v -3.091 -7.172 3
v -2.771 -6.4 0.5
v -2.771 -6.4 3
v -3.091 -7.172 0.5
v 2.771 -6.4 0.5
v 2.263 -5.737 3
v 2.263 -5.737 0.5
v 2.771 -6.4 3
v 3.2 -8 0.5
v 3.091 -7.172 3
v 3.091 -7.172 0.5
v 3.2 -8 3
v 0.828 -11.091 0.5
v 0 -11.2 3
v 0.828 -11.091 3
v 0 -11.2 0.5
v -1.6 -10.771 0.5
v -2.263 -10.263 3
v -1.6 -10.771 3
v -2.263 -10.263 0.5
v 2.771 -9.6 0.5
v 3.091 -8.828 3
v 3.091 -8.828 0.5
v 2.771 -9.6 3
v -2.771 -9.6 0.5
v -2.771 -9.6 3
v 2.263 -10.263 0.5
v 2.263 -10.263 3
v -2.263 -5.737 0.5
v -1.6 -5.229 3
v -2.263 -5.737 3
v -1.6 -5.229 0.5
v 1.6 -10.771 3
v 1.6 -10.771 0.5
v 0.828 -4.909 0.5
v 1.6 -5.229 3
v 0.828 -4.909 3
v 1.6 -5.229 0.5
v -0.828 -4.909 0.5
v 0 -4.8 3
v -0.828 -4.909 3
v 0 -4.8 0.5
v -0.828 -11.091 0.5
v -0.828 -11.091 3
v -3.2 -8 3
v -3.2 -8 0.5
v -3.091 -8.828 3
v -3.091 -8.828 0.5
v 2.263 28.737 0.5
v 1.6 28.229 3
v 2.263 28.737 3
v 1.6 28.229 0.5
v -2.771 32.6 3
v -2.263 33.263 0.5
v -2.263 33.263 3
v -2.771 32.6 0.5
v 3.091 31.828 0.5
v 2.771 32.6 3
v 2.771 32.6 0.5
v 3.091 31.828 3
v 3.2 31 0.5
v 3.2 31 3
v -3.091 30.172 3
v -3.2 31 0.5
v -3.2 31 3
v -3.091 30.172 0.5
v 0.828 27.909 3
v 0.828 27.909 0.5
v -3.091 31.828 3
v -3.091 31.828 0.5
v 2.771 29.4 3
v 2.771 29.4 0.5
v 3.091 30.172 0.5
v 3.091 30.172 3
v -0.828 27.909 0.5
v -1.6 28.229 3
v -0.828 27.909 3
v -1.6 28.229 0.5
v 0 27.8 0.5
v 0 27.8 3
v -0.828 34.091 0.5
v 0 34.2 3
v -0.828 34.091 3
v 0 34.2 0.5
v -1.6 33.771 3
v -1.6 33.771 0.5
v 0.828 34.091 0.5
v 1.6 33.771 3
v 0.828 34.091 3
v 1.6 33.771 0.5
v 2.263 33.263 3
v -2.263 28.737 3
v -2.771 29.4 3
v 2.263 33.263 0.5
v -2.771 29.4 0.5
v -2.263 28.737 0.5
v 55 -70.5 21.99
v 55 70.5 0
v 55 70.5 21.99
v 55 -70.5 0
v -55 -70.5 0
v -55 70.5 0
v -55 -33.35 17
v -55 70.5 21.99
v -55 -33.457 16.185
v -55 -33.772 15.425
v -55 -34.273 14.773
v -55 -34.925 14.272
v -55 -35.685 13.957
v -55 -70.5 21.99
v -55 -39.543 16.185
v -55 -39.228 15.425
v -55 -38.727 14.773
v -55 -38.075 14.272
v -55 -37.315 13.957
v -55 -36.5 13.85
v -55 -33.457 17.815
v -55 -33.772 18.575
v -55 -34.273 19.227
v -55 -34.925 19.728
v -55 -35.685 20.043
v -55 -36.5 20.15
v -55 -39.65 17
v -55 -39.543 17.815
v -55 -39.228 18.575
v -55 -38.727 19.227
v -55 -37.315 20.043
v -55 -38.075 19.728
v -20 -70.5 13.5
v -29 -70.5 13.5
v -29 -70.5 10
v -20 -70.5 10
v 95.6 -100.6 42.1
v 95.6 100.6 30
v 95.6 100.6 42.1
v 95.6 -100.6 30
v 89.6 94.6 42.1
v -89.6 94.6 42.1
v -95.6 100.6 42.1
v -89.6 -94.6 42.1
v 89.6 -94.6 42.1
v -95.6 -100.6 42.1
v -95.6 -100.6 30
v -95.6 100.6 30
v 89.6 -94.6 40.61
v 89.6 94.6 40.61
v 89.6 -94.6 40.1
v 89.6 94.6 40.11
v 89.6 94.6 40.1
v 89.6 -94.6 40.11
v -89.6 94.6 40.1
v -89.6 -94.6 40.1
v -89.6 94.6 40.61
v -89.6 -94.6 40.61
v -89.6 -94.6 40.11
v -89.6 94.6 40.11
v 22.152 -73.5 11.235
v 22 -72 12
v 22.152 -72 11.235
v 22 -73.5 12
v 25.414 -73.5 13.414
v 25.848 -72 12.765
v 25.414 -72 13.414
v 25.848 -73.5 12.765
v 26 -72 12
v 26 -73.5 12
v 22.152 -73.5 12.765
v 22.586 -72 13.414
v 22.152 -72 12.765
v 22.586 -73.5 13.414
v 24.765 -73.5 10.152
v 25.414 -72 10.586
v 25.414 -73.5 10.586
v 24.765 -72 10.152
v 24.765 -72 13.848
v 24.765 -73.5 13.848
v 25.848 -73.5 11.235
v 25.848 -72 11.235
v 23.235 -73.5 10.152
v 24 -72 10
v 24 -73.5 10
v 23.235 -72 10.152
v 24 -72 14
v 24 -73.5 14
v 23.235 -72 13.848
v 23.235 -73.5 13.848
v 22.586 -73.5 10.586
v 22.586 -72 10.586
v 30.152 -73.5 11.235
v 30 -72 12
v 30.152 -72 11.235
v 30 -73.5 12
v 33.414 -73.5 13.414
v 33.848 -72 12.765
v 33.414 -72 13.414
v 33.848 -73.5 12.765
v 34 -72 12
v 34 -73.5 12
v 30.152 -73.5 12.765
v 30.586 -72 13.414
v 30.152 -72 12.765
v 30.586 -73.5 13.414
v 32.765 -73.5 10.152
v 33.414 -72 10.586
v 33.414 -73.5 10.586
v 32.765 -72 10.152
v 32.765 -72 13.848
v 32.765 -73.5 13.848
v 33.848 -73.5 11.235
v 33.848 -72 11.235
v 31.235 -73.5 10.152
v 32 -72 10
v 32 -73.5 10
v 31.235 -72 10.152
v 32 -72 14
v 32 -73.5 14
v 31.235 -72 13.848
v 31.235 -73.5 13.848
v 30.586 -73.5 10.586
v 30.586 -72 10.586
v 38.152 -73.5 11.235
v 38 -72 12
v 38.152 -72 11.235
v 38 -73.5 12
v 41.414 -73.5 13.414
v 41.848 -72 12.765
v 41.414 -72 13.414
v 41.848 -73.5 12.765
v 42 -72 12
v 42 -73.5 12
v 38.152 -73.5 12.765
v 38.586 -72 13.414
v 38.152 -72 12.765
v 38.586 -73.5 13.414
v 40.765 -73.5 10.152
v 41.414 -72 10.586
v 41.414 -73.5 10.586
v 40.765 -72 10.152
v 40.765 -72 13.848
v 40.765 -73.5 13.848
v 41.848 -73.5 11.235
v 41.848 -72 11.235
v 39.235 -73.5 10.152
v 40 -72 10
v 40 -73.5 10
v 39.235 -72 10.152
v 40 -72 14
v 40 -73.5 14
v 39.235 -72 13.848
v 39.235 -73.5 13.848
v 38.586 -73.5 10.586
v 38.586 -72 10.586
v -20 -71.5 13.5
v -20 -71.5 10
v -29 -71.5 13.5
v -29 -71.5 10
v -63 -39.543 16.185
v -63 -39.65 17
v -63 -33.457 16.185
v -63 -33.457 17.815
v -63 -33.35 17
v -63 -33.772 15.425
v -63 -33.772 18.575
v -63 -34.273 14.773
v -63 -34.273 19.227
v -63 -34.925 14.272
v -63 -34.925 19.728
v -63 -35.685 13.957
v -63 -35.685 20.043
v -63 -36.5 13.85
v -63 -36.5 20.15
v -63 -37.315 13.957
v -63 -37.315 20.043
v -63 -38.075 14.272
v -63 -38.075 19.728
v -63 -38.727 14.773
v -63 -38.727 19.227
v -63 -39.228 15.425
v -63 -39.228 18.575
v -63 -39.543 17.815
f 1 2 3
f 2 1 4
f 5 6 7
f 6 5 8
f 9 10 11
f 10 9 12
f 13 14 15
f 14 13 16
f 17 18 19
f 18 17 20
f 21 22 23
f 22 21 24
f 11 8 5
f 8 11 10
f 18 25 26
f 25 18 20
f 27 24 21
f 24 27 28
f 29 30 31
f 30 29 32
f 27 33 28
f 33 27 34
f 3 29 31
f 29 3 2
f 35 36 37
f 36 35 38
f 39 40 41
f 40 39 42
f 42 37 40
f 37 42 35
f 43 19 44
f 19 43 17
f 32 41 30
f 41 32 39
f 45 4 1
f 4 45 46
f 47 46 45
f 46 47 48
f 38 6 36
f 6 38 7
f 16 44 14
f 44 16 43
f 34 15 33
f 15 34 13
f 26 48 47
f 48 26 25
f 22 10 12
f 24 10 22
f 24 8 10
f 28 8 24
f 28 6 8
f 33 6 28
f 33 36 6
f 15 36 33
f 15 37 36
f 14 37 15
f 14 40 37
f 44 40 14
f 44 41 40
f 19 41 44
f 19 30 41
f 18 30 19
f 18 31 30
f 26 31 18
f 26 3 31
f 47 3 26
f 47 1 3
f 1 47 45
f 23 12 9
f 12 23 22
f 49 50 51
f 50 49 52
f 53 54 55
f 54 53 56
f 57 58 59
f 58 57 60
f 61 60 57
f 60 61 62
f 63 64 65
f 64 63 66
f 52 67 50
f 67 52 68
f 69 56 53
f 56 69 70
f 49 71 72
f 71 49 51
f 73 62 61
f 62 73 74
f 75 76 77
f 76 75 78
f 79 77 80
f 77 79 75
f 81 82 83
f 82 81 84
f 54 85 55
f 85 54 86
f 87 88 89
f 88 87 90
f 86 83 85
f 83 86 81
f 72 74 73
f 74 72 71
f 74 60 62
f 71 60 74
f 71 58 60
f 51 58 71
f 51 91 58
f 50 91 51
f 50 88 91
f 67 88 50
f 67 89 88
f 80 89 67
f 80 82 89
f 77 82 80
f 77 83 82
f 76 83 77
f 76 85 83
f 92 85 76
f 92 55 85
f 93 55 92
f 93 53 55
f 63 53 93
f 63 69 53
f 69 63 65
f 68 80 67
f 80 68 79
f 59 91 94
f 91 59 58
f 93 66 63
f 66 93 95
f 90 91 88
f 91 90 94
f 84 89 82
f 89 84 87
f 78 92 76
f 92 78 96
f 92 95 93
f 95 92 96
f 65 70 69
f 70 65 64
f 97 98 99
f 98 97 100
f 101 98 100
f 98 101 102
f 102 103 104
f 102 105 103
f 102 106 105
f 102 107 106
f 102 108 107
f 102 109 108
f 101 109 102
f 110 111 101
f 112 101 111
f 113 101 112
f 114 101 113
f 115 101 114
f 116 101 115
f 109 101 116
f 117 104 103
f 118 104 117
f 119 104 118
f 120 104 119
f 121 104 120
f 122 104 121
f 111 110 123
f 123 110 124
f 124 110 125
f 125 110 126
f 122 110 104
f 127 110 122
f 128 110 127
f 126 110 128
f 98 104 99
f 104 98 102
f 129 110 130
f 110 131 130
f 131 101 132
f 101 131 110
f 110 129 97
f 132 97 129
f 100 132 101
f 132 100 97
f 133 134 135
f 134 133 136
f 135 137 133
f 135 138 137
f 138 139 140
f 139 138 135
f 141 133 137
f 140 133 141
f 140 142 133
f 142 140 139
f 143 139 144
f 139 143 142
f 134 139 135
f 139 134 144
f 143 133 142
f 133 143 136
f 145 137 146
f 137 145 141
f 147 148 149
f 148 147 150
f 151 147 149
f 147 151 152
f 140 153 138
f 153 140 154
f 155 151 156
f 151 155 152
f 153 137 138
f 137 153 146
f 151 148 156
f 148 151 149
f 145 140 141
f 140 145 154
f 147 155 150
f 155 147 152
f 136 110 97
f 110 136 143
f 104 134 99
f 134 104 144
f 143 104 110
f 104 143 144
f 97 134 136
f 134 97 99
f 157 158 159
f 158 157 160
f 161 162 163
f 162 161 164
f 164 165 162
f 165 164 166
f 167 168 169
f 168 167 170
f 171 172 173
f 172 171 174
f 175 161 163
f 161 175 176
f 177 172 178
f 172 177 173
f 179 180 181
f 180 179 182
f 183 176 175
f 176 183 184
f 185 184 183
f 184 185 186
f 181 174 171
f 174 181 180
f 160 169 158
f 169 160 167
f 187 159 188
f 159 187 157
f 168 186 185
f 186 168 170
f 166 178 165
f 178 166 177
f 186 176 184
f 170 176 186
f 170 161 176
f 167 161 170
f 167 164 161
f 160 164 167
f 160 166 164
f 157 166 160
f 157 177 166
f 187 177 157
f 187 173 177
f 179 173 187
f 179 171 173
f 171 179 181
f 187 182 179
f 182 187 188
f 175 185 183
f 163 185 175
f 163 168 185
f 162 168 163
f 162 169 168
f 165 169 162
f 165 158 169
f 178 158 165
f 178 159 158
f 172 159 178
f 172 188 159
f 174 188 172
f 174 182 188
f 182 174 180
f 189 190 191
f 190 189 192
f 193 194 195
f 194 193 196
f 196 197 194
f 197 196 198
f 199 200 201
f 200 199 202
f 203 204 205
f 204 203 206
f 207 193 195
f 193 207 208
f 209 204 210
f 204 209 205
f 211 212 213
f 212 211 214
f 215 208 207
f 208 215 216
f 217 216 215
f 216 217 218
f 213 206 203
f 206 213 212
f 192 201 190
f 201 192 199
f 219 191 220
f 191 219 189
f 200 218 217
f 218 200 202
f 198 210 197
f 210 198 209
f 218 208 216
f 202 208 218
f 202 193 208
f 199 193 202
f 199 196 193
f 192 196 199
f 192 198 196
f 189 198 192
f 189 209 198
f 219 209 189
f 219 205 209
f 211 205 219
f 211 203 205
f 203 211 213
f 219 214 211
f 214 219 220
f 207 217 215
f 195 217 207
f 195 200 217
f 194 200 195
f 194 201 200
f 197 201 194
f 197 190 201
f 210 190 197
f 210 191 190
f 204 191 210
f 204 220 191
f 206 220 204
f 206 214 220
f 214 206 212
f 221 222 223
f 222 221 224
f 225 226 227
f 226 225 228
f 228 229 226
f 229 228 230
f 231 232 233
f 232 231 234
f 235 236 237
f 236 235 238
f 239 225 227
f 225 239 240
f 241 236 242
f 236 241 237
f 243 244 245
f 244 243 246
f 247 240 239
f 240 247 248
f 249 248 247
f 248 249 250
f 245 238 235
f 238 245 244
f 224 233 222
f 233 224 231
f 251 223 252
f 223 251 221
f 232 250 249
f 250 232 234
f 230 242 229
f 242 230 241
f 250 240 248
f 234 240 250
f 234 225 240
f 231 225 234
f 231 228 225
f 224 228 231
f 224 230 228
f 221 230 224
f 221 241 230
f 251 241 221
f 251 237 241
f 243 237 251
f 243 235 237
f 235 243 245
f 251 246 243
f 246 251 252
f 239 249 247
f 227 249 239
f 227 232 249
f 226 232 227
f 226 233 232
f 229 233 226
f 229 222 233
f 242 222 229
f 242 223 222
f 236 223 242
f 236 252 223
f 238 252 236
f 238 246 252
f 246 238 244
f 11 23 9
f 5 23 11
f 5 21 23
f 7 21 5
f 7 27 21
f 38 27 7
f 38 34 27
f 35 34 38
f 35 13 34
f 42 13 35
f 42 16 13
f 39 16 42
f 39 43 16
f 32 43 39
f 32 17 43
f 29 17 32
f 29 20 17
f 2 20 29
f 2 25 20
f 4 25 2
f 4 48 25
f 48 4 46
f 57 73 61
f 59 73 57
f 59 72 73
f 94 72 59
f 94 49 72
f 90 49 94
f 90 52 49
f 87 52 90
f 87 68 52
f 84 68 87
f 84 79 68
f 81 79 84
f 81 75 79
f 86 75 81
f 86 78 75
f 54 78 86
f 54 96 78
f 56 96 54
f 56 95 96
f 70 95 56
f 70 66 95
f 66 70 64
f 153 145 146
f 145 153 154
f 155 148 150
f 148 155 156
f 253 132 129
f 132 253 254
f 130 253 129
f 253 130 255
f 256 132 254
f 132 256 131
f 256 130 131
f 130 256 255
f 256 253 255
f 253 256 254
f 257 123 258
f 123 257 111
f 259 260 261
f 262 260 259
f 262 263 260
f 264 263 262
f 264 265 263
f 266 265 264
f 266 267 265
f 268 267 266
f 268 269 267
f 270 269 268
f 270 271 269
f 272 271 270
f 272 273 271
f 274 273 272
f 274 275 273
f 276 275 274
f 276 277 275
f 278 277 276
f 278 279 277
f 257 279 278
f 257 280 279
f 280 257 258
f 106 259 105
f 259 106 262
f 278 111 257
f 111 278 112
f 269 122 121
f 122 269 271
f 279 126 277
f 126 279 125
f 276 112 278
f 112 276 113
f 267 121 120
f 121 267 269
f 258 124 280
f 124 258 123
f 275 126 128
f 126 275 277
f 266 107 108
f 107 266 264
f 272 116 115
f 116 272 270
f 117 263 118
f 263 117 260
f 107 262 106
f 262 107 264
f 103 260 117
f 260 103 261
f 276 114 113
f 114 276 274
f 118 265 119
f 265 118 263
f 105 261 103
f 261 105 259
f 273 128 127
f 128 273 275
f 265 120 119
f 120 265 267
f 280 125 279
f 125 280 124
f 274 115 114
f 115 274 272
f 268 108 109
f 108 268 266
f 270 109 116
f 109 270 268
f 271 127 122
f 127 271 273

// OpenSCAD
// Visual models of the Seeed SenseCAP Solar Node P1 and antennas, for
// checking fit on the roof mount. Case size from the datasheet; the back box,
// inserts and ports measured from Seeed's product photos; skirt and box
// heights estimated. Origin at the case center on the box face, +Y away from
// the port end, +Z into the panel.

node_w = 191.2;
node_l = 201.2;
node_h = 42.1;
node_box = [110, 141, 22];   // w, l, wall height of the back box
node_box_c_y = 0;
node_insert_spacing = 39;
node_insert_offset = 11.5;
node_rim = 6;                // panel frame rim width
node_skirt_h = 8;

module p1_node() {
  color("lightgray") {
    // Back box, screws, inserts.
    difference() {
      translate([-node_box[0] / 2, node_box_c_y - node_box[1] / 2, 0]) cube(node_box);
      for (s = [-1, 1]) translate([0, node_insert_offset + s * node_insert_spacing / 2, -1]) cylinder(d = 6.4, h = 4, $fn = 24);
    }
    // Skirt from the box up and out to the panel frame.
    hull() {
      translate([-node_box[0] / 2, node_box_c_y - node_box[1] / 2, node_box[2] - 0.01]) cube([node_box[0], node_box[1], 0.01]);
      translate([-node_w / 2, -node_l / 2, node_box[2] + node_skirt_h]) cube([node_w, node_l, 0.01]);
    }
    // Panel frame.
    difference() {
      translate([-node_w / 2, -node_l / 2, node_box[2] + node_skirt_h]) cube([node_w, node_l, node_h - node_box[2] - node_skirt_h]);
      translate([-node_w / 2 + node_rim, -node_l / 2 + node_rim, node_h - 2]) cube([node_w - 2 * node_rim, node_l - 2 * node_rim, 3]);
    }
  }
  color([0.1, 0.1, 0.15]) translate([-node_w / 2 + node_rim, -node_l / 2 + node_rim, node_h - 1.99]) cube([node_w - 2 * node_rim, node_l - 2 * node_rim, 0.5]);
  // Port face: buttons, LEDs, USB-C, RP-SMA jack.
  // Port face, as seen from above with the port end to the rear: buttons on
  // the right, USB-C and the RP-SMA jack on the left.
  color("black") for (x = [24, 32, 40]) translate([x, node_box_c_y - node_box[1] / 2 - 1.5, 12]) rotate([90, 0, 0]) cylinder(d = 4, h = 1.5, $fn = 16);
  color("black") translate([-29, node_box_c_y - node_box[1] / 2 - 1, 10]) cube([9, 1, 3.5]);
  // RP-SMA jack on the left side face, 34 mm from the port end, 17 mm up, pointing outboard.
  color("gold") translate([-node_box[0] / 2, node_box_c_y - node_box[1] / 2 + 34, 17]) rotate([0, -90, 0]) cylinder(d = 6.3, h = 8, $fn = 24);
  for (s = [-1, 1]) color("gold") translate([0, node_insert_offset + s * node_insert_spacing / 2, 0]) cylinder(d = 8, h = 0.5, $fn = 24);
}

// Stock Seeed 2 dBi rod, about 195 mm, RP-SMA male. Length estimated.
module seeed_rod() {
  color("black") { cylinder(d = 10, h = 20, $fn = 24); translate([0, 0, 20]) cylinder(d = 9, h = 175, $fn = 24); }
  color("gold") translate([0, 0, -8]) cylinder(d = 8, h = 8, $fn = 24);
}

// Z=0 is the pylon's bulkhead flange seating plane. Overall antenna length
// includes the coupling; coupling stack is provisional, not a measured fit.
module alfa_915(n_flange = [24, 3.5], coupling_d = 22, coupling_h = 18) {
  color("silver") cylinder(d = n_flange[0], h = n_flange[1], $fn = 96);
  color("silver") translate([0, 0, n_flange[1]]) cylinder(d = coupling_d, h = coupling_h, $fn = 96);
  color([0.15, 0.15, 0.15]) translate([0, 0, n_flange[1] + coupling_h])
    cylinder(d = 22, h = 180 - coupling_h, $fn = 96);
  color("gold") translate([0, 0, -15]) cylinder(d = 15.875, h = 15, $fn = 64);
}

p1_node();

// DIYMAG 1.69" rubber-coated magnet with a 1/4" stud. Body height estimated.
module magnet_foot(body_h = 7, stud_len = 12.7) {
  color([0.12, 0.12, 0.12]) translate([0, 0, -body_h]) cylinder(d = 43, h = body_h, $fn = 64);
  color("silver") cylinder(d = 6.35, h = stud_len, $fn = 20);
}

// Cable as a chain of spheres along a polyline, with an RP-SMA plug at the end.
module cable(pts, d = 3.4) {
  color([0.1, 0.1, 0.1]) for (i = [0 : len(pts) - 2]) hull() { translate(pts[i]) sphere(d = d, $fn = 12); translate(pts[i + 1]) sphere(d = d, $fn = 12); }
}
module rpsma_plug() color("gold") { cylinder(d = 8, h = 10, $fn = 6); translate([0, 0, 10]) cylinder(d = 6.5, h = 5, $fn = 20); }
